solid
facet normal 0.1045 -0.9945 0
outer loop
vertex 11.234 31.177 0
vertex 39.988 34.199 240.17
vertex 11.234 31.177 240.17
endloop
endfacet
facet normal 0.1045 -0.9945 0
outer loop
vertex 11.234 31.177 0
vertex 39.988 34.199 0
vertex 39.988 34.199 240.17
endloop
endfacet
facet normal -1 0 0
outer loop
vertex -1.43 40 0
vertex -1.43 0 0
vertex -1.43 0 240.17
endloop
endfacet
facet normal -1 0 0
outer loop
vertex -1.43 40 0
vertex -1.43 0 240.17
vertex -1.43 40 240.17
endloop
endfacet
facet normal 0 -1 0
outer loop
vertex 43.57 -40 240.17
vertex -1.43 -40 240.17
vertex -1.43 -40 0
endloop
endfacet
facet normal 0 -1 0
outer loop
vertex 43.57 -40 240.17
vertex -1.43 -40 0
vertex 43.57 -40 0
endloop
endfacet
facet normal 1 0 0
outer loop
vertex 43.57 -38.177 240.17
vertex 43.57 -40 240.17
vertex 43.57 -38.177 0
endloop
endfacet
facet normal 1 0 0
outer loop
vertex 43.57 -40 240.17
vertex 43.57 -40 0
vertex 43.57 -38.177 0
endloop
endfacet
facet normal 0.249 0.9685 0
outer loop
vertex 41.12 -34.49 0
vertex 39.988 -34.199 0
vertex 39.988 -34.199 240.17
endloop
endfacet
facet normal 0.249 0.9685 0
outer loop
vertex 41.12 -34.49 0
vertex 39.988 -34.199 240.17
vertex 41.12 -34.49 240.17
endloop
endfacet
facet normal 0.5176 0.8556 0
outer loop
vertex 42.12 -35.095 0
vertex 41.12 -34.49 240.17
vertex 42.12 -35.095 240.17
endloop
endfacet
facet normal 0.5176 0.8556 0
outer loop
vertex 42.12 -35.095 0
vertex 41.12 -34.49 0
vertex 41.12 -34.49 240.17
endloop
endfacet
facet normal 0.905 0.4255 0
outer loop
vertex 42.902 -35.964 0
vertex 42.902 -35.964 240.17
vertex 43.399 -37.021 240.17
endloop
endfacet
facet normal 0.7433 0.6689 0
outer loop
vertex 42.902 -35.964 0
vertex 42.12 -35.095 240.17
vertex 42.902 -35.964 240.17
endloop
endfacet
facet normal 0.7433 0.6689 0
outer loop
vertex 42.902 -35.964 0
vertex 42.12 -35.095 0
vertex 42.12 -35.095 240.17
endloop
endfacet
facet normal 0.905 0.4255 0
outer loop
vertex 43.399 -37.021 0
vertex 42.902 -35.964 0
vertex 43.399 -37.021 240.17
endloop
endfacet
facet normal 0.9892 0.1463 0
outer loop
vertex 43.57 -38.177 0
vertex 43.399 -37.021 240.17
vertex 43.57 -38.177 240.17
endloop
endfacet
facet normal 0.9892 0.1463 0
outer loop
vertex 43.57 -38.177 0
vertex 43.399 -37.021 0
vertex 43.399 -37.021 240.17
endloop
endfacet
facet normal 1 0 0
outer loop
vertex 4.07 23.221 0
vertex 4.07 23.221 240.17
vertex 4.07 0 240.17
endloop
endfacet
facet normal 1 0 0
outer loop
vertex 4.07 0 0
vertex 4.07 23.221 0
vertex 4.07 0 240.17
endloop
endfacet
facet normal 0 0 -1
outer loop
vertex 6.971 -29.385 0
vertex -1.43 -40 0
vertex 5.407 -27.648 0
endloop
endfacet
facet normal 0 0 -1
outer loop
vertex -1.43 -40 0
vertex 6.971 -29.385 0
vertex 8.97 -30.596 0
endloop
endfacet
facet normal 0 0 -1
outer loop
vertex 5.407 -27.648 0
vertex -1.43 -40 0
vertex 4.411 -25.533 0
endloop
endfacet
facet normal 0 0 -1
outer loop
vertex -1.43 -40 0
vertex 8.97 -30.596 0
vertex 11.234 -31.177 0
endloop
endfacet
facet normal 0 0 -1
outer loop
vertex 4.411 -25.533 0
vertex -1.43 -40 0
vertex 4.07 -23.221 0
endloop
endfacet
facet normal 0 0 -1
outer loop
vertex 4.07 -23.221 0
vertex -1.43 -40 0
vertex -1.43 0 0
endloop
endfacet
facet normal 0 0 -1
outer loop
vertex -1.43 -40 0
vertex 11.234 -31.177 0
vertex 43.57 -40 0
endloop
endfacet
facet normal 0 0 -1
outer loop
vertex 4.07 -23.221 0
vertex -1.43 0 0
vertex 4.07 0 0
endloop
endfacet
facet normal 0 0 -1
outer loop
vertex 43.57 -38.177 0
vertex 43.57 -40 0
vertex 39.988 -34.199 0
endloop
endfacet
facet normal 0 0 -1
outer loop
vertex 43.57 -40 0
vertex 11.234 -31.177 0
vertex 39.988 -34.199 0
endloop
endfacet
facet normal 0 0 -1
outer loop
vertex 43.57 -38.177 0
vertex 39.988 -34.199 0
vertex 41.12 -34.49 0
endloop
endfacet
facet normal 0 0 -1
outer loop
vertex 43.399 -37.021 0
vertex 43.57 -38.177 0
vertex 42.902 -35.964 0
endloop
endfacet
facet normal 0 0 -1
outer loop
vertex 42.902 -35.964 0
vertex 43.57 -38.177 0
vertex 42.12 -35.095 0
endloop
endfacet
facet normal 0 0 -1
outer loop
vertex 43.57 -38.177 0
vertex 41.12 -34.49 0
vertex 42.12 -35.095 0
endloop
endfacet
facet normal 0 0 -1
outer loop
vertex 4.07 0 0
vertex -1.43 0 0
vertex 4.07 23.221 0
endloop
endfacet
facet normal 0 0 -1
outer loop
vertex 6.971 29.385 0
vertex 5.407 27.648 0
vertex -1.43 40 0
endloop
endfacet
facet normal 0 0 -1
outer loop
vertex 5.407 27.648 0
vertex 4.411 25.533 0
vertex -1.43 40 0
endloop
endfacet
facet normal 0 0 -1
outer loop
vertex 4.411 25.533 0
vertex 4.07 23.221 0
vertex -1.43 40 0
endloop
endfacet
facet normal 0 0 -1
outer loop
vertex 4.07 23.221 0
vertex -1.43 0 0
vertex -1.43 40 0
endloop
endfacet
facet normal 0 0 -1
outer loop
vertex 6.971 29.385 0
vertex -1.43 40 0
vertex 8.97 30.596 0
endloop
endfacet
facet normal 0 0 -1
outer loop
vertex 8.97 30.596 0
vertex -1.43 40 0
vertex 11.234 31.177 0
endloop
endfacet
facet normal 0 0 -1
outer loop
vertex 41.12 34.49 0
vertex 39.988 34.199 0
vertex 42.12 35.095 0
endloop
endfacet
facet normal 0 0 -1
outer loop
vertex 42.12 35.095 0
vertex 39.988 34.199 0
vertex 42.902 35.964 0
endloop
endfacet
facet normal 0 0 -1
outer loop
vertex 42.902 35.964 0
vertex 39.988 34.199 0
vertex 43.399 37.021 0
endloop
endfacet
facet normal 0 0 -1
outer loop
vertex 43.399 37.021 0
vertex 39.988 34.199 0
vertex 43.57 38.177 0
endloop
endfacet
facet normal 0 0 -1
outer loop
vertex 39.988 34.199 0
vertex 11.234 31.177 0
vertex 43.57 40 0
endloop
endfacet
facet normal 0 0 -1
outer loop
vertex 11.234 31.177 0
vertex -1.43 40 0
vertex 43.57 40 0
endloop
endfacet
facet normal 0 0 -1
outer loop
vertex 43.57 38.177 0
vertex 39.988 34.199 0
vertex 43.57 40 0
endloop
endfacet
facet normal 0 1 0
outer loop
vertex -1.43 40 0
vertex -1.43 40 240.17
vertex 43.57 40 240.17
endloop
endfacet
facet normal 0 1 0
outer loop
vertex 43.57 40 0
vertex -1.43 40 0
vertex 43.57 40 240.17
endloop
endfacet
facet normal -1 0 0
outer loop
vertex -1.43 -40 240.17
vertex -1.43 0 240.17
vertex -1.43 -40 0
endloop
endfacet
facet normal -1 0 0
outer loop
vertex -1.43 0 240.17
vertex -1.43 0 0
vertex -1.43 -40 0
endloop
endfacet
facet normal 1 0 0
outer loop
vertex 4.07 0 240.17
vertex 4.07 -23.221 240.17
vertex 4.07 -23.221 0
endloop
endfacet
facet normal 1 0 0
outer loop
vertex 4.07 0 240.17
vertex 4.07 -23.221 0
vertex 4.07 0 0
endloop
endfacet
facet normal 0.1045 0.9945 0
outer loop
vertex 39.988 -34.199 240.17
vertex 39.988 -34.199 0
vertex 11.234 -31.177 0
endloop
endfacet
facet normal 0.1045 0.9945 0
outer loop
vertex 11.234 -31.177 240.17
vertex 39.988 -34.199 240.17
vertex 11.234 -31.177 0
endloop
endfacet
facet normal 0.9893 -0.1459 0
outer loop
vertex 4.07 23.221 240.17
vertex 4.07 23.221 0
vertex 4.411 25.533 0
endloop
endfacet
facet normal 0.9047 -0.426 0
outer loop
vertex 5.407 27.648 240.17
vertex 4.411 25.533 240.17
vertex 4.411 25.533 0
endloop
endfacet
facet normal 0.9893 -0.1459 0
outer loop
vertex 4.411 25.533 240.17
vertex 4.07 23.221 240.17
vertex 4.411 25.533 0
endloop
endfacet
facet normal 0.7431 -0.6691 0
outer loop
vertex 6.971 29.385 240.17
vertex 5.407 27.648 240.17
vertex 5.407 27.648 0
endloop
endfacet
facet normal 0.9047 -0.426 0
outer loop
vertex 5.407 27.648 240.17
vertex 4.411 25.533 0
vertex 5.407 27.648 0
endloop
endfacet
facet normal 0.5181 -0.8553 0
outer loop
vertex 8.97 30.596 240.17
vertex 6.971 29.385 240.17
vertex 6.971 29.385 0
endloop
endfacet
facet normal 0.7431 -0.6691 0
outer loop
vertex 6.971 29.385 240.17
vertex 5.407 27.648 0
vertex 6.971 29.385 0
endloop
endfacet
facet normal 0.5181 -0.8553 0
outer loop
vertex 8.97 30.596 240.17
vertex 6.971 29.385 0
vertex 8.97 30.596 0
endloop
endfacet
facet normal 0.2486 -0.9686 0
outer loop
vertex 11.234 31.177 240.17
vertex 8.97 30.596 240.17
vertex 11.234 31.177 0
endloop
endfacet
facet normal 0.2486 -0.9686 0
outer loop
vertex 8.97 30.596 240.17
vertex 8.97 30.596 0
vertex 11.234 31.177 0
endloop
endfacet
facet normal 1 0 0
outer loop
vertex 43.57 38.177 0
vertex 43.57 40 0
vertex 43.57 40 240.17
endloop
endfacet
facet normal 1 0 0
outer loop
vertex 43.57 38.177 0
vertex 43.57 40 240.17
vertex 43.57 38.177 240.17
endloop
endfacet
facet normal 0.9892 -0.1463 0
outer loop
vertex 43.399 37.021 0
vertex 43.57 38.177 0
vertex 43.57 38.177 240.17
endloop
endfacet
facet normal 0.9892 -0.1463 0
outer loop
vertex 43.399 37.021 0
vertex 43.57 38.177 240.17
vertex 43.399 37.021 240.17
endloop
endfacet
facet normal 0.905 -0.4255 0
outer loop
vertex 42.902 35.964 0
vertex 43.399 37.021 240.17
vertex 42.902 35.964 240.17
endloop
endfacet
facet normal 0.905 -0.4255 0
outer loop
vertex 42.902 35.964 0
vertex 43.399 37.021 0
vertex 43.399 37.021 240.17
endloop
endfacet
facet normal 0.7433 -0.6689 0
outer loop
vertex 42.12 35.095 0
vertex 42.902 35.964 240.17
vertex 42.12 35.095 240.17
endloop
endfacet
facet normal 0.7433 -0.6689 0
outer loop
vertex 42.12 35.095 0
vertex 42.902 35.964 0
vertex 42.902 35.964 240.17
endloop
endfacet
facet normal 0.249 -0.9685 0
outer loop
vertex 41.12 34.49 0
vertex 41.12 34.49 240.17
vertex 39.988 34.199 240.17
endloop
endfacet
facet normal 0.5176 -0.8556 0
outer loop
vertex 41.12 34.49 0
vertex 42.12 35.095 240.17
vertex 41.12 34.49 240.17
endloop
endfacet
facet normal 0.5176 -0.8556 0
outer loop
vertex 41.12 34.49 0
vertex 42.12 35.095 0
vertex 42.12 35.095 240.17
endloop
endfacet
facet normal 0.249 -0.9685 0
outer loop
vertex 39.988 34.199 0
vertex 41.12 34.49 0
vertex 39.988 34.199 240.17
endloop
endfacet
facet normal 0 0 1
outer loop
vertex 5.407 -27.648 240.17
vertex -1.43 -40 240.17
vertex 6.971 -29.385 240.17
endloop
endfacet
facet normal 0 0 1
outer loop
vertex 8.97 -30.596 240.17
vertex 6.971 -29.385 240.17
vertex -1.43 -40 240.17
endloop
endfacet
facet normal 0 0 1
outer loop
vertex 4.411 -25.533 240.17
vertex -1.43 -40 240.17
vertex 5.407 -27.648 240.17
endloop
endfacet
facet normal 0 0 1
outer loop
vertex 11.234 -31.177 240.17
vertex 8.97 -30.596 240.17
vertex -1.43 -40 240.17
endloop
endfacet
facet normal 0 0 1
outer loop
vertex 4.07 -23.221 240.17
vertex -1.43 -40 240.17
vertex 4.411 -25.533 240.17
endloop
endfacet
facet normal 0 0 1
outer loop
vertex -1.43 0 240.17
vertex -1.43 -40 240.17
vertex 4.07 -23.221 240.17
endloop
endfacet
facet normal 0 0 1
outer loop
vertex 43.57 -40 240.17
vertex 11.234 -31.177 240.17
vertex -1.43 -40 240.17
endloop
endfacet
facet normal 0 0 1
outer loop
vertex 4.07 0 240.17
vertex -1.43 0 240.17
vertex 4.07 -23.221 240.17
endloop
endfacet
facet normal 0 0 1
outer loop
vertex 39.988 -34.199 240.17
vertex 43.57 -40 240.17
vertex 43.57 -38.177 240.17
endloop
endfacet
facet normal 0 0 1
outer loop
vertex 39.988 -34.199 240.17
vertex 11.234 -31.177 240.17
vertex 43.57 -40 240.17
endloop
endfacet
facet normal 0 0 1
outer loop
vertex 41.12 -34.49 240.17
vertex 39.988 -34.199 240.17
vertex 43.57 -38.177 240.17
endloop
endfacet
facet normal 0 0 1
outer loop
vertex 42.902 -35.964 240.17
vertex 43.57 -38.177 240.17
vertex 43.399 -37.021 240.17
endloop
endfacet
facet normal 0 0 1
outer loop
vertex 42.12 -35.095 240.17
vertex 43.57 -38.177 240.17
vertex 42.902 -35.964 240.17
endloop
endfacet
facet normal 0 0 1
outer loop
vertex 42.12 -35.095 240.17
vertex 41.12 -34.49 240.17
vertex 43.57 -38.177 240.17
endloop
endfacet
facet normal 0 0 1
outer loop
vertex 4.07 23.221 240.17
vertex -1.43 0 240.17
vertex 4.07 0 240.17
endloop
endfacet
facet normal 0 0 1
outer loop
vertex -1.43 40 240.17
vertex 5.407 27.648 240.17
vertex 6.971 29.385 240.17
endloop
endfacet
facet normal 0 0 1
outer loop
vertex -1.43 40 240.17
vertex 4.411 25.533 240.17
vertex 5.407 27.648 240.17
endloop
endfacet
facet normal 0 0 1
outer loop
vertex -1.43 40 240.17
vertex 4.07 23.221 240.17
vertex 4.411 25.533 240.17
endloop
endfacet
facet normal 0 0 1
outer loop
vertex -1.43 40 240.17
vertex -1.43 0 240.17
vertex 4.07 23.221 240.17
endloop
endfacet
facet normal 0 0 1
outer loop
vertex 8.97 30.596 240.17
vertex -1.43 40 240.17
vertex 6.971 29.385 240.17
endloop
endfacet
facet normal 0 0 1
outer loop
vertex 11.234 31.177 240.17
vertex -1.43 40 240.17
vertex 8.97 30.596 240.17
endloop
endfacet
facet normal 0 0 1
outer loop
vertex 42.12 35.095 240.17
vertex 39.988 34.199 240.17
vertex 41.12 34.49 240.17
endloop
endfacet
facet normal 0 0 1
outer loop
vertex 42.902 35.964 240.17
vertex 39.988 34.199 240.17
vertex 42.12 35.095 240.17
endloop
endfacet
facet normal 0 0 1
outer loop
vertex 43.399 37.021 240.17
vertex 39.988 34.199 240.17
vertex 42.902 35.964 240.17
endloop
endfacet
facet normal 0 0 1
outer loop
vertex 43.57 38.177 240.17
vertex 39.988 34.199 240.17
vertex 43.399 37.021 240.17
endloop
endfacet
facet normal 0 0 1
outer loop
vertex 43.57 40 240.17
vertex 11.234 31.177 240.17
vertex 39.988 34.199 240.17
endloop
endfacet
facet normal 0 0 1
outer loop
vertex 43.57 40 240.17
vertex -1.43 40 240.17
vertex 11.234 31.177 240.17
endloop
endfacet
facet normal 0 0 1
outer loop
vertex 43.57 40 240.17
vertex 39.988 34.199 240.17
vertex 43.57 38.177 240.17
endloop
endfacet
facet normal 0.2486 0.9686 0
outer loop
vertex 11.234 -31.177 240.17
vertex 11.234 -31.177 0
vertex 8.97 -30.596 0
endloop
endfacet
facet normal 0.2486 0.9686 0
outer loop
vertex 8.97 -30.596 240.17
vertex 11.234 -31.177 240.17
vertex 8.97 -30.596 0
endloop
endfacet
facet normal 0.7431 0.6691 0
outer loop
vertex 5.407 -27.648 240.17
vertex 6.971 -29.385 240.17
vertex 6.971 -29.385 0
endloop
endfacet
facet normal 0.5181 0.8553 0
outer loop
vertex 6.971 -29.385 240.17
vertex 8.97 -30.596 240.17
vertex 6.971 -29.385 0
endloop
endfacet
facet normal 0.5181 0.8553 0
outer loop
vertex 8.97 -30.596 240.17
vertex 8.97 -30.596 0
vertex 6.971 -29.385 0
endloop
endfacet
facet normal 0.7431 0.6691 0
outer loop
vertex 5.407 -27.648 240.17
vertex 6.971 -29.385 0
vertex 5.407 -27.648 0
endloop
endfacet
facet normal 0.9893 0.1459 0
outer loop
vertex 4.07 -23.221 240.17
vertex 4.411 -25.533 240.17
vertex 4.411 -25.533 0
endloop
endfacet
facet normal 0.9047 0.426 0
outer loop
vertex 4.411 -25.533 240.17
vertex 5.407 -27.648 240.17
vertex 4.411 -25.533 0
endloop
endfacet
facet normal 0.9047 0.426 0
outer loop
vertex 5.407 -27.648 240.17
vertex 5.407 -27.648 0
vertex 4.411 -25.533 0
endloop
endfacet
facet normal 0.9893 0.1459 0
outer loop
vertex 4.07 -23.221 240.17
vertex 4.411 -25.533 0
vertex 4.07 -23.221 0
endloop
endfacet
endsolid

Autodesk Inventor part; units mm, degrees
ref_plane "YZ Plane" through (0, 0, 0) normal (1, 0, 0) x (0, 1, 0)
ref_plane "Начальная плоскость" through (0, 0, 0) normal (0, 0, 1) x (1, 0, 0)
ref_plane "Конечная плоскость" through (0, 0, 240.17) normal (0, 0, 1) x (1, 0, 0)
sketch "Эскиз" plane through (0, 0, 0) normal (0, 0, 1) x (1, 0, 0)
  line L0 (-1.43, 0) -> (-1.43, 40)
  line L1 (-1.43, 40) -> (43.57, 40)
  line L2 (43.57, 40) -> (43.57, 38.1774)
  line L3 (39.9881, 34.1993) -> (11.2338, 31.1771)
  line L4 (4.07, 23.221) -> (4.07, 0)
  line L5 (4.07, 0) -> (-1.43, 0) construction
  line L6 (23.82, 40) -> (23.82, 32.5) construction
  line L7 (43.57, 34.5758) -> (43.57, 32.5) construction
  line L8 (43.57, 32.5) -> (23.82, 32.5) construction
  line L9 (0, 15) -> (0, -27) construction
  line L10 (-5.539, 0) -> (16.0067, 0) construction
  line L11 (-1.43, 0) -> (-1.43, -40)
  line L12 (-1.43, -40) -> (43.57, -40)
  line L13 (43.57, -40) -> (43.57, -38.1774)
  line L14 (39.9881, -34.1993) -> (11.2338, -31.1771)
  line L15 (4.07, -23.221) -> (4.07, 0)
  arc A0 (11.2338, 31.1771) -> (4.07, 23.221) centre (12.07, 23.221) ccw
  arc A1 (4.07, -23.221) -> (11.2338, -31.1771) centre (12.07, -23.221) ccw
  arc A2 (39.9881, 34.1993) -> (43.57, 38.1774) centre (39.57, 38.1774) ccw
  arc A3 (43.57, -38.1774) -> (39.9881, -34.1993) centre (39.57, -38.1774) ccw
  line L16 (0, 56) -> (0, -56) construction
  line L17 (-15.5135, 0) -> (54.308, 0) construction
  point P0 (4.07, 30.4242)
  point P1 (43.57, -34.5758)
  point P2 (4.07, -30.4242)
  point P3 (23.82, -40)
  point P4 (23.82, -32.5)
  dimension "d0" = 5.5
  dimension "d1" = 40
  dimension "d2" = 45
  dimension "d3" = 7.5
  dimension "d4" = 19.75
  dimension "d5" = 2.0758
  dimension "d23" = 8
  dimension "d24" = 4
  dimension "d25" = 1.43
extrude "Тело" add sketch "Эскиз" along normal up to surface (240.17 mm away) from surface at 0
sketch "Sketch3" plane through (0, 0, 0) normal (0, 0, 1) x (1, 0, 0)
  line L0 (0, 0) -> (10, 0)
ref_plane "Work Plane3" through (0, 0, 0) normal (0, -1, 0) x (1, 0, 0)
sketch "Sketch4" plane through (0, 0, 0) normal (0, -1, 0) x (1, 0, 0)
  line L0 (-2, 0) -> (12, 0)
  line L1 (-2, 240.17) -> (12, 240.17)
  dimension "d29" = 240.17
equation "\"d0\" = G_T"
equation "\"d1\" = 0.5 * G_H"
equation "\"d2\" = G_W"
equation "\"d3\" = G_T1"
equation "\"d4\" = G_C"
equation "\"d23\" = G_IR"
equation "\"d24\" = G_ER"
equation "\"d25\" = ex"
equation "\"d6\" = G_L"
equation "\"G_W\" = 45"
equation "\"G_T\" = 5.5"
equation "\"G_T1\" = 7.5"
equation "\"G_NG\" = 0.105104"
equation "\"G_ER\" = 4"
equation "\"G_IR\" = 8"
equation "\"G_C\" = 19.75"
equation "\"G_L\" = d29"
equation "\"ex\" = 1.43"
equation "\"G_OFFSET_START\" = 0"
equation "\"G_OFFSET_END\" = 0"
equation "\"d27\" = G_OFFSET_END + B_L"
equation "\"B_L\" = 240.17"
equation "\"G_H\" = 80"
properties part number "ISO 657/11 - CH 80 x 8 - 240,17" material "Сталь, мягкая"
